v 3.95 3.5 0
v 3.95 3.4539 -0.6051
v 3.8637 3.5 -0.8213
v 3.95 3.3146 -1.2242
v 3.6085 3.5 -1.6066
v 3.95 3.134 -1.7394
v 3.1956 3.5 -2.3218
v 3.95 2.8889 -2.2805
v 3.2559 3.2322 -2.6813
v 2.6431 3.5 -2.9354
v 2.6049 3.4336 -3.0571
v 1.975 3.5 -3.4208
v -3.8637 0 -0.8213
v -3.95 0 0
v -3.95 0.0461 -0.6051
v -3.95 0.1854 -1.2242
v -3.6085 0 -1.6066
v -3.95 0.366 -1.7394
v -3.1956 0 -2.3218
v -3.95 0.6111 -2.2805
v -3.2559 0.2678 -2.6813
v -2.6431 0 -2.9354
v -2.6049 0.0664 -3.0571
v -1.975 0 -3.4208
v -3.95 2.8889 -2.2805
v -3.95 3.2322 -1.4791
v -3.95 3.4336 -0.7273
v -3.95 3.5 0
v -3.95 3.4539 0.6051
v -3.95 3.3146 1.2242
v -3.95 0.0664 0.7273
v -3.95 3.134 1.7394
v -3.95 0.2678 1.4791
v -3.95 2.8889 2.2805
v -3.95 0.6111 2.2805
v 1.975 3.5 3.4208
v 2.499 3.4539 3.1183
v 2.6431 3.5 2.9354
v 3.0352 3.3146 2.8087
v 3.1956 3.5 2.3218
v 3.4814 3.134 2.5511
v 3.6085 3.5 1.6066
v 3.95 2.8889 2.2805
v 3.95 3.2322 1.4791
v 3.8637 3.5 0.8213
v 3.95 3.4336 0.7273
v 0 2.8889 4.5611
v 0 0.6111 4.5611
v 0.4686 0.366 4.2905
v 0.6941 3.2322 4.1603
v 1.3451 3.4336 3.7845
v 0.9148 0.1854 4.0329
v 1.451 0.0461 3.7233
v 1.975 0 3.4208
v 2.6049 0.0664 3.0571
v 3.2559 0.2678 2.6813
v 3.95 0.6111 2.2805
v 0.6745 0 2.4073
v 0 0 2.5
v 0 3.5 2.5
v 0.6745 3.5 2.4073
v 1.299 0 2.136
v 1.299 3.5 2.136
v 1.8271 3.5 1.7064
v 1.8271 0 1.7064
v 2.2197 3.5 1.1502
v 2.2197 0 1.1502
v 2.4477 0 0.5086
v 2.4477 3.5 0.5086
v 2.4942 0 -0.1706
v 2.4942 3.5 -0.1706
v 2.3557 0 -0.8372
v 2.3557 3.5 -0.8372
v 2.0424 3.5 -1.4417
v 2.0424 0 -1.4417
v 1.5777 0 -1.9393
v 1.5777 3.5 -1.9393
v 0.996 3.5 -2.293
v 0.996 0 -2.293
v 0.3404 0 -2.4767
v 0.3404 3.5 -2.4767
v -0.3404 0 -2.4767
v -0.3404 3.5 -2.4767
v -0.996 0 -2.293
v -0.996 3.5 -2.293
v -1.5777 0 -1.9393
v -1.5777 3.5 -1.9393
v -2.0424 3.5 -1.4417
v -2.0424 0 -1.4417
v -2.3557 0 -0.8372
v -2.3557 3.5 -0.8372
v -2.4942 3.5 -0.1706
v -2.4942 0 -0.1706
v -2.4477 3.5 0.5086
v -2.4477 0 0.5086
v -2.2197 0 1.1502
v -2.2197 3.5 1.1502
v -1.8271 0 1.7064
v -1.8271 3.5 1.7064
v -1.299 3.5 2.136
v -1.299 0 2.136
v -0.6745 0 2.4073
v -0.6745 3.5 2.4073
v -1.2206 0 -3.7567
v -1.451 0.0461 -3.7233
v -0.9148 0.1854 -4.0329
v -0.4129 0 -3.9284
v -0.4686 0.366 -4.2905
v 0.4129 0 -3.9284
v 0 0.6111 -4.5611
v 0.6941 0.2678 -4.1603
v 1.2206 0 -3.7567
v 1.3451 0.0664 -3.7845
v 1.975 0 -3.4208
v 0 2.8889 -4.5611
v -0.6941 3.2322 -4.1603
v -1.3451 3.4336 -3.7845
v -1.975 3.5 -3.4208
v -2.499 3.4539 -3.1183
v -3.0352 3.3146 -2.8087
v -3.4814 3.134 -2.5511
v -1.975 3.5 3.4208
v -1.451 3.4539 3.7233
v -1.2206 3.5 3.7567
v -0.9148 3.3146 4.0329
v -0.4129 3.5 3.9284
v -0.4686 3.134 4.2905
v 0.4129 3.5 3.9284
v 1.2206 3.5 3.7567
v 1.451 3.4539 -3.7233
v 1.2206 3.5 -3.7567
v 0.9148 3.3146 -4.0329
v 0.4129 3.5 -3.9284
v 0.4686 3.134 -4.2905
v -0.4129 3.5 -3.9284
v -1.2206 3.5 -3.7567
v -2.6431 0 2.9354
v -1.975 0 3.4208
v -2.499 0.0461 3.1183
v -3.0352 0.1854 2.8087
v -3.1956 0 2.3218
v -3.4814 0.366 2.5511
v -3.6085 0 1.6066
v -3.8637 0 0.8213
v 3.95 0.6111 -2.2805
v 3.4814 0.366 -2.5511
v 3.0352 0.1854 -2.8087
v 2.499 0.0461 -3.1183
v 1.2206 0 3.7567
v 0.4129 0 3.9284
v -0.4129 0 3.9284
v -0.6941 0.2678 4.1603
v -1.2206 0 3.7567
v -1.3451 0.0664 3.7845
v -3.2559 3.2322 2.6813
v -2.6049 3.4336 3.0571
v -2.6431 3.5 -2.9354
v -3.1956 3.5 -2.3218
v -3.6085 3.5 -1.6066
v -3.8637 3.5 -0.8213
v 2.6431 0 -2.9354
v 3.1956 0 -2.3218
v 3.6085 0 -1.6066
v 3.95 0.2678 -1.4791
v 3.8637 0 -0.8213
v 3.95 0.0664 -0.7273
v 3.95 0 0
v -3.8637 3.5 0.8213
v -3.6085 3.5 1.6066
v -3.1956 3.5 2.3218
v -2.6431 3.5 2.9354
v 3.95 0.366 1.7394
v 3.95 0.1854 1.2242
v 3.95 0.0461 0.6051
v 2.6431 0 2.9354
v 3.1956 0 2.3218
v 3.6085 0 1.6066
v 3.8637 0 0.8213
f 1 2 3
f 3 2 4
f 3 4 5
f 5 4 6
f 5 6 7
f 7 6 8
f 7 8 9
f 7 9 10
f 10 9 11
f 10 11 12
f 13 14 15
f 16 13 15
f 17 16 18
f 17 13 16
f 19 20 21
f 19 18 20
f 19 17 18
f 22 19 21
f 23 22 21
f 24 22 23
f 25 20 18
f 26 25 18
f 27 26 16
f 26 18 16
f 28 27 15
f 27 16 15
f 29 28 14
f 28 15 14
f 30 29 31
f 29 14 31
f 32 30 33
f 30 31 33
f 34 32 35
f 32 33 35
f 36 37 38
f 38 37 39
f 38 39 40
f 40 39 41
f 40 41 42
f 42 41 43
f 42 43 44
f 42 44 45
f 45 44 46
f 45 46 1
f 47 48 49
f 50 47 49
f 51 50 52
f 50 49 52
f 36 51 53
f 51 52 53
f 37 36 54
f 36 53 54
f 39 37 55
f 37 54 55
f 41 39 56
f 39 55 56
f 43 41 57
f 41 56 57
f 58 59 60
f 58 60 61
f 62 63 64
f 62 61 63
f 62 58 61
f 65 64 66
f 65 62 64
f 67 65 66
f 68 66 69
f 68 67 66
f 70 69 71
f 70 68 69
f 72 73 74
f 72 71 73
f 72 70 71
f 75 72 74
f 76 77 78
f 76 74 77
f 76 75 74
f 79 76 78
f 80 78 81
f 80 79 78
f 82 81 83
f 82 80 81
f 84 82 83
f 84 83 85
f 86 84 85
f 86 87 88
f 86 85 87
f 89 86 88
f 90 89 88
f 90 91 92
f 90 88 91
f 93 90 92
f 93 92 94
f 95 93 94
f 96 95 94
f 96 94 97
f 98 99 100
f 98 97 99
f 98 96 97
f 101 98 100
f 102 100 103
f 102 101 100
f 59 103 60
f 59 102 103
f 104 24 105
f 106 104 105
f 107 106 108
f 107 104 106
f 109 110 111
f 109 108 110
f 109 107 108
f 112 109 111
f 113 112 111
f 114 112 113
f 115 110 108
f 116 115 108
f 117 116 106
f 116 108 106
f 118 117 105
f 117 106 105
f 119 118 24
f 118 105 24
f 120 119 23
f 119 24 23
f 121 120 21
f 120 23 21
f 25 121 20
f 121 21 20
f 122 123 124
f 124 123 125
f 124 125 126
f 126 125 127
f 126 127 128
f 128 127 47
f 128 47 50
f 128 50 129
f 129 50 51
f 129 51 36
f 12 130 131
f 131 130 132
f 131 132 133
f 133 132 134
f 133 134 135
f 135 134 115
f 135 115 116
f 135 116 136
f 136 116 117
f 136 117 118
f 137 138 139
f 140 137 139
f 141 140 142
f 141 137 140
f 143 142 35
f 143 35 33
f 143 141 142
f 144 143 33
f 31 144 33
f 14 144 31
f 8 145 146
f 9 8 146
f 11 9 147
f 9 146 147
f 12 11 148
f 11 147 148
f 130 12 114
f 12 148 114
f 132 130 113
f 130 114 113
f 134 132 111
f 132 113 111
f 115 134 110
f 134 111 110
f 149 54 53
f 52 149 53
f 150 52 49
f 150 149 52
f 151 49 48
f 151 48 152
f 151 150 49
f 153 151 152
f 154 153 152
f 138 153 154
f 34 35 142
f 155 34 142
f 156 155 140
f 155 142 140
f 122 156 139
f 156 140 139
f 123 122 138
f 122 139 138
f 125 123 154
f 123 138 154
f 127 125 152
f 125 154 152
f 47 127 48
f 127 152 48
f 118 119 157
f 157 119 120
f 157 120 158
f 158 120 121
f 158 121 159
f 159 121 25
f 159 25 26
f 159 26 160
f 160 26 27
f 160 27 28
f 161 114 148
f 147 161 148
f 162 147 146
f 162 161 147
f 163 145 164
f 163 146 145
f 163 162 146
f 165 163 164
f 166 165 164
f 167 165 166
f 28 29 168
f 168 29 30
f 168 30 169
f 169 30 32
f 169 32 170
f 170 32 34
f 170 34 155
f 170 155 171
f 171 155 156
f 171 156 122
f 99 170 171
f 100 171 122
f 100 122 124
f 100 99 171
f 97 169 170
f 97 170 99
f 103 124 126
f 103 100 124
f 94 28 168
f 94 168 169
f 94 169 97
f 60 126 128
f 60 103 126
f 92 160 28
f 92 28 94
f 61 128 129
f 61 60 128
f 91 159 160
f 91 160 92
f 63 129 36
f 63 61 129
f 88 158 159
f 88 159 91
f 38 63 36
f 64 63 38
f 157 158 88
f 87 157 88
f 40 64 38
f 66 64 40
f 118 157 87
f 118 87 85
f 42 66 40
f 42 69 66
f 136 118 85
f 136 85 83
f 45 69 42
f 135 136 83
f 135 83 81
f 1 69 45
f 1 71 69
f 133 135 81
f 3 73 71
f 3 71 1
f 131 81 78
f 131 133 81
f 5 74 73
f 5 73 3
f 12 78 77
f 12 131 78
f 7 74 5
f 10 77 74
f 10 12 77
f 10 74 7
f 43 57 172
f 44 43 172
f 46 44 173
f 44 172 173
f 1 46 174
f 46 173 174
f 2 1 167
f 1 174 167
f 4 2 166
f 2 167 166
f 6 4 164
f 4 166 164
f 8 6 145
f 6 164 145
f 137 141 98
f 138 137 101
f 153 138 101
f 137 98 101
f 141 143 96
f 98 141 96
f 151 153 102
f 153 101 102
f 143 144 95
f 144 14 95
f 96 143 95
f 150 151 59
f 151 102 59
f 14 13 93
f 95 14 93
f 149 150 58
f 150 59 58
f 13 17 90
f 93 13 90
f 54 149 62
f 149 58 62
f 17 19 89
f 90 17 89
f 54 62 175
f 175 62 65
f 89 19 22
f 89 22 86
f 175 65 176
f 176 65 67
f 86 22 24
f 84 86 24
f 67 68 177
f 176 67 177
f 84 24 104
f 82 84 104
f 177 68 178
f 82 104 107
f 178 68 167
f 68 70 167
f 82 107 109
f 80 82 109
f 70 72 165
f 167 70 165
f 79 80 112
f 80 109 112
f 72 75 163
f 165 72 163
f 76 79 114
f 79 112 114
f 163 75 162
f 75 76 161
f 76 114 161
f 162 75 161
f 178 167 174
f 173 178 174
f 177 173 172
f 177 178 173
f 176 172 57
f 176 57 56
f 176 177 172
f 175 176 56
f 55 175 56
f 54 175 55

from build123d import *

# Parameters (mm, degrees)
BOSS_EXTRUDE1_DEPTH     = 3.5
CUT_EXTRUDE1_DEPTH      = 7.975373347
CUT_EXTRUDE1_DEPTH_BACK = 7.975373347
SKETCH2_R               = 2.5
SKETCH4_OUTSIDE_W       = 79.412
SKETCH4_OUTSIDE_H       = 80.634
SKETCH4_OUTSIDE_R       = 3.95
CUT_EXTRUDE4_DEPTH      = 33.5
CUT_EXTRUDE4_DRAFT      = -45


# Read off the part's stored shape, not the designer's step: Cut-Extrude2
with BuildPart() as part:
    # Sketch1 → Boss-Extrude1 (new body)
    with BuildSketch(Plane(origin=(0, 0, 0), x_dir=(1, 0, 0), z_dir=(0, 1, 0))):
        Polygon((3.95, -2.280533563), (3.95, 2.280533563), (0, 4.561067127), (-3.95, 2.280533563), (-3.95, -2.280533563), (0, -4.561067127), align=None)
    extrude(amount=BOSS_EXTRUDE1_DEPTH)

    # Sketch2 → Cut-Extrude1 (cut, two sides: drawn at the far end of the back side and taken through both)
    with BuildSketch(Plane(origin=(0, 3.5, 0), x_dir=(1, 0, 0), z_dir=(0, 1, 0)).offset(-CUT_EXTRUDE1_DEPTH_BACK)):
        with Locations(Location((0, 0, 0), (0, 0, 270))):
            Circle(SKETCH2_R)
    extrude(amount=CUT_EXTRUDE1_DEPTH + CUT_EXTRUDE1_DEPTH_BACK, mode=Mode.SUBTRACT)

    # Cut-Extrude2 outline → Cut-Extrude2 (revolve, cut)
    with BuildSketch(Plane.XY):
        Polygon((4.561067183, 3.500000074), (3.949999968, 3.500000074), (4.561067135, 2.888932865), align=None)
    revolve(axis=Axis((0, 0, 0), (0, 1, 0)), mode=Mode.SUBTRACT)


with BuildPart() as cut_extrude4_tool:
    # Sketch4 outside → Cut-Extrude4 (with draft: the straight prism first)
    with BuildSketch(Plane.XZ):
        Rectangle(SKETCH4_OUTSIDE_W, SKETCH4_OUTSIDE_H)
        Circle(SKETCH4_OUTSIDE_R, mode=Mode.SUBTRACT)
    extrude(amount=-CUT_EXTRUDE4_DEPTH)
    # Cut-Extrude4: the draft: its side faces are tilted about the plane it starts from
    cut_extrude4_sides = [cut_extrude4_tool.faces().sort_by_distance(p)[0] for p in [
        (0, 16.75, -40.317),
        (39.706, 16.75, 0),
        (0, 16.75, 40.317),
        (-39.706, 16.75, 0),
        (-3.95, 16.75, 0),
    ]]
    draft(cut_extrude4_sides, Plane.XZ, CUT_EXTRUDE4_DRAFT)


with BuildPart() as part_1:
    add(part.part)

    # Cut-Extrude4: cut by cut_extrude4_tool
    add(cut_extrude4_tool.part, mode=Mode.SUBTRACT)


solid = part_1.part
